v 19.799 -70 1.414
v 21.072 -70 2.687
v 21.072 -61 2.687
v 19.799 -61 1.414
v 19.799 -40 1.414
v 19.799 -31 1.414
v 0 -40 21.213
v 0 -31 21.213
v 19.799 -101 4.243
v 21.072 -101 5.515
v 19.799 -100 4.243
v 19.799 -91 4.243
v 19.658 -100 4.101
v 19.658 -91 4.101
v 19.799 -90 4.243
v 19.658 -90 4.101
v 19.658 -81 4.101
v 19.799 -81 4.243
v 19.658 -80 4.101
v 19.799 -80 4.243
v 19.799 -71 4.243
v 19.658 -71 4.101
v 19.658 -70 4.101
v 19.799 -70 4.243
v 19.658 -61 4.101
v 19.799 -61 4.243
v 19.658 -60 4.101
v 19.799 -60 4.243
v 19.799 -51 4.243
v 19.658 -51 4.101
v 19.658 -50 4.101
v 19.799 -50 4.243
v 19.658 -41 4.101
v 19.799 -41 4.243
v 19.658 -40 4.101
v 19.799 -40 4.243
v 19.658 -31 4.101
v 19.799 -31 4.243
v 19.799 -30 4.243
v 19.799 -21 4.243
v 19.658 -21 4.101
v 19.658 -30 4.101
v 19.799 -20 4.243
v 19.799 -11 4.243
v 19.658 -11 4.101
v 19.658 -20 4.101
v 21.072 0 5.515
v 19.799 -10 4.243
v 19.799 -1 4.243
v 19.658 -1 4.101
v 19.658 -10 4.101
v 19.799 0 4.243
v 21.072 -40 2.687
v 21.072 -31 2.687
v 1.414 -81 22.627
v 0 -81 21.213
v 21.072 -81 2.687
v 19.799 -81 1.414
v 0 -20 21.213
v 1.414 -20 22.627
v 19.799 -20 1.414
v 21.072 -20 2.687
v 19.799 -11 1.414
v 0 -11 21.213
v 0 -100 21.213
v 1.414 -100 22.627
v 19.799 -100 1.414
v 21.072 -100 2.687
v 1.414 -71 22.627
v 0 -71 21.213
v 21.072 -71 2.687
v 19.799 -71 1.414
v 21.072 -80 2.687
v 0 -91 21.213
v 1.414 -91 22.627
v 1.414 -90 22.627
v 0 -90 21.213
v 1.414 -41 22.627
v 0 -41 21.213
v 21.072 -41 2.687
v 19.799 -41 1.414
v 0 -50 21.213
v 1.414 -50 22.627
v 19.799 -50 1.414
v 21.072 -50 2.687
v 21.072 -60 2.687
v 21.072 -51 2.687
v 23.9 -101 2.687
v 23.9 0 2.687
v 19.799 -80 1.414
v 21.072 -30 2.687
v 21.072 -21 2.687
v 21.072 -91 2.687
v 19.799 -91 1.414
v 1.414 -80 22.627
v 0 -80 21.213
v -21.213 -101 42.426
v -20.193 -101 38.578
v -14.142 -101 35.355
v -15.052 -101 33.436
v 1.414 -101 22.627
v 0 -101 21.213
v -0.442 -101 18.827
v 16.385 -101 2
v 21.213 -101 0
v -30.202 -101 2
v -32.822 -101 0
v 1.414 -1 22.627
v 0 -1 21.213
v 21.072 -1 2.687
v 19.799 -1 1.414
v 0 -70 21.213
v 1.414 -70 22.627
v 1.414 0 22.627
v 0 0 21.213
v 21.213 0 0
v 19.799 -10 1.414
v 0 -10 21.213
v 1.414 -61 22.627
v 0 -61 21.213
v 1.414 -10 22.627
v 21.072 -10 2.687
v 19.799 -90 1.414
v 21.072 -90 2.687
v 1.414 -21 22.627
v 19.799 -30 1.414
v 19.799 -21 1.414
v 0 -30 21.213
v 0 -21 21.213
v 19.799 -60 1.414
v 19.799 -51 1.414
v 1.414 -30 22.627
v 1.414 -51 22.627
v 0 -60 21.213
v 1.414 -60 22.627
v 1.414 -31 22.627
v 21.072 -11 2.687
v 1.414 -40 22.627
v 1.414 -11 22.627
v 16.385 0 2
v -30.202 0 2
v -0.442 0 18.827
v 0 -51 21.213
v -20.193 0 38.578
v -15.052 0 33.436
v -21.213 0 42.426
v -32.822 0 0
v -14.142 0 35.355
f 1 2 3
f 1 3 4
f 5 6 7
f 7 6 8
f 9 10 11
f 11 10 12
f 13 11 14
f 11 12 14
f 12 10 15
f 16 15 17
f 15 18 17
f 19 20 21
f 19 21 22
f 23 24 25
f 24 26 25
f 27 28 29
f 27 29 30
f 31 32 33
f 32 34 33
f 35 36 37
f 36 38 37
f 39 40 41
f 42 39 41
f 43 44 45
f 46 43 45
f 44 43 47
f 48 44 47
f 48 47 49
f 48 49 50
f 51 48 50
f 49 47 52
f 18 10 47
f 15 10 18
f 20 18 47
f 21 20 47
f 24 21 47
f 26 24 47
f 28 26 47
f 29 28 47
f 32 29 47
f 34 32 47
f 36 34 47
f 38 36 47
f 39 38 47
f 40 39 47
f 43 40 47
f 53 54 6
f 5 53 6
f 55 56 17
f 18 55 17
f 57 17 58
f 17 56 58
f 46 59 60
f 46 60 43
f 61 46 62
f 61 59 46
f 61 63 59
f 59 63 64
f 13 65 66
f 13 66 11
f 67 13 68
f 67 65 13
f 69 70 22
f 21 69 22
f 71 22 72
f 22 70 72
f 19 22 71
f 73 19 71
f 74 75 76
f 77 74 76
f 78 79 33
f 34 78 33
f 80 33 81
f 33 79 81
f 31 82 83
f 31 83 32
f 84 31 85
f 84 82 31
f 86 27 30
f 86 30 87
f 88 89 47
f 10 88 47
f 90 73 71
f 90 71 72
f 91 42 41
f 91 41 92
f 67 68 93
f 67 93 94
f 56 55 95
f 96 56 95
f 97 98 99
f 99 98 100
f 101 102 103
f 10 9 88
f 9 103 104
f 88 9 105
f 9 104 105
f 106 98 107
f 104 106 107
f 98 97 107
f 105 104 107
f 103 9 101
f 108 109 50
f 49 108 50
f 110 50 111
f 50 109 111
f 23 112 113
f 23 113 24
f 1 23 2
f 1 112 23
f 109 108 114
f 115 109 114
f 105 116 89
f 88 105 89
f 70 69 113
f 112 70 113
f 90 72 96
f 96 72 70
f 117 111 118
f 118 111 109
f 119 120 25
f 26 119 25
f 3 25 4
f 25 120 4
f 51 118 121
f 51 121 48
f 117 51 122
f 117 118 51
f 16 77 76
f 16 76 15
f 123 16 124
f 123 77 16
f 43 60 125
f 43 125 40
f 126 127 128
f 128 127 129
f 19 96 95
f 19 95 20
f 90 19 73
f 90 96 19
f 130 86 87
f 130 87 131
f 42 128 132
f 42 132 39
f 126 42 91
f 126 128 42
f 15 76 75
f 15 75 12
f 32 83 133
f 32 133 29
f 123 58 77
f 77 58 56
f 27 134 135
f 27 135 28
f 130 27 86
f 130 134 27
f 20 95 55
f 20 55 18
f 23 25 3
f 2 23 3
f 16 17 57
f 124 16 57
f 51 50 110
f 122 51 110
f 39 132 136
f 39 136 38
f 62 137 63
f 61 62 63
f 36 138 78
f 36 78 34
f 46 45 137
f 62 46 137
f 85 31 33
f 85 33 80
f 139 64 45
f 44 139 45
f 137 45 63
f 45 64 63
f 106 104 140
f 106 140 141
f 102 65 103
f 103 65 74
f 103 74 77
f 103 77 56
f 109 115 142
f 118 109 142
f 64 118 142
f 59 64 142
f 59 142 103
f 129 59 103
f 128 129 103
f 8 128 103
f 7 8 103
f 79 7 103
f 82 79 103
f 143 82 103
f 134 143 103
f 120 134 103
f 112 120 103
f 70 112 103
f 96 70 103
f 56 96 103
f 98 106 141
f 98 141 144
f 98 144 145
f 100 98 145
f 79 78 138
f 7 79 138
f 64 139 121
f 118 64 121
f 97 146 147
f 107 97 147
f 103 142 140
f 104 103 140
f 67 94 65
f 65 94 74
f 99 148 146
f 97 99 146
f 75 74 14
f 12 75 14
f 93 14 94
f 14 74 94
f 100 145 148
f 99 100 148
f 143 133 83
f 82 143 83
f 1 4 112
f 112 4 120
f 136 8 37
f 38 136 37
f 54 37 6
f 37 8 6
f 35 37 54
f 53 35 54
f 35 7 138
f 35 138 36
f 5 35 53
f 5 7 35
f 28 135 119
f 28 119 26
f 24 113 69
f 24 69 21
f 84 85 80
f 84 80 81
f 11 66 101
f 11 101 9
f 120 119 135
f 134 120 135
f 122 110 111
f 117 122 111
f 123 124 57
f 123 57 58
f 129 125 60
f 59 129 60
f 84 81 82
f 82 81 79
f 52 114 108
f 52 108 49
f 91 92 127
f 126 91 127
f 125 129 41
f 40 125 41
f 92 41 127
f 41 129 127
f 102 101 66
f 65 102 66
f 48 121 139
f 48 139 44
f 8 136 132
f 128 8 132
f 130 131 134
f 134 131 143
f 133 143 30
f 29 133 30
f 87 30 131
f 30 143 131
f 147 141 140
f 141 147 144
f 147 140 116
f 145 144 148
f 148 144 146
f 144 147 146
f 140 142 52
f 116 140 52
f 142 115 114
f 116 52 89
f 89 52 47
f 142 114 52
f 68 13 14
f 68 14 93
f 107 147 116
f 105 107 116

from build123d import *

# Parameters (mm, degrees)
F1_DEPTH = 101
F2_W     = 28
F2_H     = 1
F3_DEPTH = 2


with BuildPart() as f1:
    # F0 (on Front) → F1 (new body)
    with BuildSketch(Plane.XZ):
        Polygon((19.7989898732, 1.4142135624), (0, 21.2132034356), (-0.4420594911, 18.826835802), (16.3847763109, 2), (-30.2015638745, 2), (-20.19282931, 38.5776056209), (-15.051559592, 33.4363359028), (-14.1421356237, 35.3553390593), (-21.2132034356, 42.4264068712), (-32.8223461799, 0), (-9.7140957444, 0), (21.2132034356, 0), align=None)
        Polygon((21.0717820794, 2.6870057685), (19.7989898732, 1.4142135624), (21.2132034356, 0), (23.9002092041, 2.6870057685), (21.0717820794, 5.5154328933), (19.657568517, 4.1012193309), align=None)
    extrude(amount=F1_DEPTH)

    # F2 (on face) → F3 (join)
    with BuildSketch(Plane(origin=(10.6066017178, 0, 10.6066017178), x_dir=(0.7071067812, 0, -0.7071067812), z_dir=(0.7071067812, 0, 0.7071067812))):
        with Locations((-1, -100.5)):
            Rectangle(F2_W, F2_H)
        with Locations((-1, -90.5)):
            Rectangle(F2_W, F2_H)
        with Locations((-1, -80.5)):
            Rectangle(F2_W, F2_H)
        with Locations((-1, -70.5)):
            Rectangle(F2_W, F2_H)
        with Locations((-1, -60.5)):
            Rectangle(F2_W, F2_H)
        with Locations((-1, -50.5)):
            Rectangle(F2_W, F2_H)
        with Locations((-1, -40.5)):
            Rectangle(F2_W, F2_H)
        with Locations((-1, -30.5)):
            Rectangle(F2_W, F2_H)
        with Locations((-1, -20.5)):
            Rectangle(F2_W, F2_H)
        with Locations((-1, -0.5)):
            Rectangle(F2_W, F2_H)
        with Locations((-1, -10.5)):
            Rectangle(F2_W, F2_H)
    extrude(amount=F3_DEPTH)


solid = f1.part
